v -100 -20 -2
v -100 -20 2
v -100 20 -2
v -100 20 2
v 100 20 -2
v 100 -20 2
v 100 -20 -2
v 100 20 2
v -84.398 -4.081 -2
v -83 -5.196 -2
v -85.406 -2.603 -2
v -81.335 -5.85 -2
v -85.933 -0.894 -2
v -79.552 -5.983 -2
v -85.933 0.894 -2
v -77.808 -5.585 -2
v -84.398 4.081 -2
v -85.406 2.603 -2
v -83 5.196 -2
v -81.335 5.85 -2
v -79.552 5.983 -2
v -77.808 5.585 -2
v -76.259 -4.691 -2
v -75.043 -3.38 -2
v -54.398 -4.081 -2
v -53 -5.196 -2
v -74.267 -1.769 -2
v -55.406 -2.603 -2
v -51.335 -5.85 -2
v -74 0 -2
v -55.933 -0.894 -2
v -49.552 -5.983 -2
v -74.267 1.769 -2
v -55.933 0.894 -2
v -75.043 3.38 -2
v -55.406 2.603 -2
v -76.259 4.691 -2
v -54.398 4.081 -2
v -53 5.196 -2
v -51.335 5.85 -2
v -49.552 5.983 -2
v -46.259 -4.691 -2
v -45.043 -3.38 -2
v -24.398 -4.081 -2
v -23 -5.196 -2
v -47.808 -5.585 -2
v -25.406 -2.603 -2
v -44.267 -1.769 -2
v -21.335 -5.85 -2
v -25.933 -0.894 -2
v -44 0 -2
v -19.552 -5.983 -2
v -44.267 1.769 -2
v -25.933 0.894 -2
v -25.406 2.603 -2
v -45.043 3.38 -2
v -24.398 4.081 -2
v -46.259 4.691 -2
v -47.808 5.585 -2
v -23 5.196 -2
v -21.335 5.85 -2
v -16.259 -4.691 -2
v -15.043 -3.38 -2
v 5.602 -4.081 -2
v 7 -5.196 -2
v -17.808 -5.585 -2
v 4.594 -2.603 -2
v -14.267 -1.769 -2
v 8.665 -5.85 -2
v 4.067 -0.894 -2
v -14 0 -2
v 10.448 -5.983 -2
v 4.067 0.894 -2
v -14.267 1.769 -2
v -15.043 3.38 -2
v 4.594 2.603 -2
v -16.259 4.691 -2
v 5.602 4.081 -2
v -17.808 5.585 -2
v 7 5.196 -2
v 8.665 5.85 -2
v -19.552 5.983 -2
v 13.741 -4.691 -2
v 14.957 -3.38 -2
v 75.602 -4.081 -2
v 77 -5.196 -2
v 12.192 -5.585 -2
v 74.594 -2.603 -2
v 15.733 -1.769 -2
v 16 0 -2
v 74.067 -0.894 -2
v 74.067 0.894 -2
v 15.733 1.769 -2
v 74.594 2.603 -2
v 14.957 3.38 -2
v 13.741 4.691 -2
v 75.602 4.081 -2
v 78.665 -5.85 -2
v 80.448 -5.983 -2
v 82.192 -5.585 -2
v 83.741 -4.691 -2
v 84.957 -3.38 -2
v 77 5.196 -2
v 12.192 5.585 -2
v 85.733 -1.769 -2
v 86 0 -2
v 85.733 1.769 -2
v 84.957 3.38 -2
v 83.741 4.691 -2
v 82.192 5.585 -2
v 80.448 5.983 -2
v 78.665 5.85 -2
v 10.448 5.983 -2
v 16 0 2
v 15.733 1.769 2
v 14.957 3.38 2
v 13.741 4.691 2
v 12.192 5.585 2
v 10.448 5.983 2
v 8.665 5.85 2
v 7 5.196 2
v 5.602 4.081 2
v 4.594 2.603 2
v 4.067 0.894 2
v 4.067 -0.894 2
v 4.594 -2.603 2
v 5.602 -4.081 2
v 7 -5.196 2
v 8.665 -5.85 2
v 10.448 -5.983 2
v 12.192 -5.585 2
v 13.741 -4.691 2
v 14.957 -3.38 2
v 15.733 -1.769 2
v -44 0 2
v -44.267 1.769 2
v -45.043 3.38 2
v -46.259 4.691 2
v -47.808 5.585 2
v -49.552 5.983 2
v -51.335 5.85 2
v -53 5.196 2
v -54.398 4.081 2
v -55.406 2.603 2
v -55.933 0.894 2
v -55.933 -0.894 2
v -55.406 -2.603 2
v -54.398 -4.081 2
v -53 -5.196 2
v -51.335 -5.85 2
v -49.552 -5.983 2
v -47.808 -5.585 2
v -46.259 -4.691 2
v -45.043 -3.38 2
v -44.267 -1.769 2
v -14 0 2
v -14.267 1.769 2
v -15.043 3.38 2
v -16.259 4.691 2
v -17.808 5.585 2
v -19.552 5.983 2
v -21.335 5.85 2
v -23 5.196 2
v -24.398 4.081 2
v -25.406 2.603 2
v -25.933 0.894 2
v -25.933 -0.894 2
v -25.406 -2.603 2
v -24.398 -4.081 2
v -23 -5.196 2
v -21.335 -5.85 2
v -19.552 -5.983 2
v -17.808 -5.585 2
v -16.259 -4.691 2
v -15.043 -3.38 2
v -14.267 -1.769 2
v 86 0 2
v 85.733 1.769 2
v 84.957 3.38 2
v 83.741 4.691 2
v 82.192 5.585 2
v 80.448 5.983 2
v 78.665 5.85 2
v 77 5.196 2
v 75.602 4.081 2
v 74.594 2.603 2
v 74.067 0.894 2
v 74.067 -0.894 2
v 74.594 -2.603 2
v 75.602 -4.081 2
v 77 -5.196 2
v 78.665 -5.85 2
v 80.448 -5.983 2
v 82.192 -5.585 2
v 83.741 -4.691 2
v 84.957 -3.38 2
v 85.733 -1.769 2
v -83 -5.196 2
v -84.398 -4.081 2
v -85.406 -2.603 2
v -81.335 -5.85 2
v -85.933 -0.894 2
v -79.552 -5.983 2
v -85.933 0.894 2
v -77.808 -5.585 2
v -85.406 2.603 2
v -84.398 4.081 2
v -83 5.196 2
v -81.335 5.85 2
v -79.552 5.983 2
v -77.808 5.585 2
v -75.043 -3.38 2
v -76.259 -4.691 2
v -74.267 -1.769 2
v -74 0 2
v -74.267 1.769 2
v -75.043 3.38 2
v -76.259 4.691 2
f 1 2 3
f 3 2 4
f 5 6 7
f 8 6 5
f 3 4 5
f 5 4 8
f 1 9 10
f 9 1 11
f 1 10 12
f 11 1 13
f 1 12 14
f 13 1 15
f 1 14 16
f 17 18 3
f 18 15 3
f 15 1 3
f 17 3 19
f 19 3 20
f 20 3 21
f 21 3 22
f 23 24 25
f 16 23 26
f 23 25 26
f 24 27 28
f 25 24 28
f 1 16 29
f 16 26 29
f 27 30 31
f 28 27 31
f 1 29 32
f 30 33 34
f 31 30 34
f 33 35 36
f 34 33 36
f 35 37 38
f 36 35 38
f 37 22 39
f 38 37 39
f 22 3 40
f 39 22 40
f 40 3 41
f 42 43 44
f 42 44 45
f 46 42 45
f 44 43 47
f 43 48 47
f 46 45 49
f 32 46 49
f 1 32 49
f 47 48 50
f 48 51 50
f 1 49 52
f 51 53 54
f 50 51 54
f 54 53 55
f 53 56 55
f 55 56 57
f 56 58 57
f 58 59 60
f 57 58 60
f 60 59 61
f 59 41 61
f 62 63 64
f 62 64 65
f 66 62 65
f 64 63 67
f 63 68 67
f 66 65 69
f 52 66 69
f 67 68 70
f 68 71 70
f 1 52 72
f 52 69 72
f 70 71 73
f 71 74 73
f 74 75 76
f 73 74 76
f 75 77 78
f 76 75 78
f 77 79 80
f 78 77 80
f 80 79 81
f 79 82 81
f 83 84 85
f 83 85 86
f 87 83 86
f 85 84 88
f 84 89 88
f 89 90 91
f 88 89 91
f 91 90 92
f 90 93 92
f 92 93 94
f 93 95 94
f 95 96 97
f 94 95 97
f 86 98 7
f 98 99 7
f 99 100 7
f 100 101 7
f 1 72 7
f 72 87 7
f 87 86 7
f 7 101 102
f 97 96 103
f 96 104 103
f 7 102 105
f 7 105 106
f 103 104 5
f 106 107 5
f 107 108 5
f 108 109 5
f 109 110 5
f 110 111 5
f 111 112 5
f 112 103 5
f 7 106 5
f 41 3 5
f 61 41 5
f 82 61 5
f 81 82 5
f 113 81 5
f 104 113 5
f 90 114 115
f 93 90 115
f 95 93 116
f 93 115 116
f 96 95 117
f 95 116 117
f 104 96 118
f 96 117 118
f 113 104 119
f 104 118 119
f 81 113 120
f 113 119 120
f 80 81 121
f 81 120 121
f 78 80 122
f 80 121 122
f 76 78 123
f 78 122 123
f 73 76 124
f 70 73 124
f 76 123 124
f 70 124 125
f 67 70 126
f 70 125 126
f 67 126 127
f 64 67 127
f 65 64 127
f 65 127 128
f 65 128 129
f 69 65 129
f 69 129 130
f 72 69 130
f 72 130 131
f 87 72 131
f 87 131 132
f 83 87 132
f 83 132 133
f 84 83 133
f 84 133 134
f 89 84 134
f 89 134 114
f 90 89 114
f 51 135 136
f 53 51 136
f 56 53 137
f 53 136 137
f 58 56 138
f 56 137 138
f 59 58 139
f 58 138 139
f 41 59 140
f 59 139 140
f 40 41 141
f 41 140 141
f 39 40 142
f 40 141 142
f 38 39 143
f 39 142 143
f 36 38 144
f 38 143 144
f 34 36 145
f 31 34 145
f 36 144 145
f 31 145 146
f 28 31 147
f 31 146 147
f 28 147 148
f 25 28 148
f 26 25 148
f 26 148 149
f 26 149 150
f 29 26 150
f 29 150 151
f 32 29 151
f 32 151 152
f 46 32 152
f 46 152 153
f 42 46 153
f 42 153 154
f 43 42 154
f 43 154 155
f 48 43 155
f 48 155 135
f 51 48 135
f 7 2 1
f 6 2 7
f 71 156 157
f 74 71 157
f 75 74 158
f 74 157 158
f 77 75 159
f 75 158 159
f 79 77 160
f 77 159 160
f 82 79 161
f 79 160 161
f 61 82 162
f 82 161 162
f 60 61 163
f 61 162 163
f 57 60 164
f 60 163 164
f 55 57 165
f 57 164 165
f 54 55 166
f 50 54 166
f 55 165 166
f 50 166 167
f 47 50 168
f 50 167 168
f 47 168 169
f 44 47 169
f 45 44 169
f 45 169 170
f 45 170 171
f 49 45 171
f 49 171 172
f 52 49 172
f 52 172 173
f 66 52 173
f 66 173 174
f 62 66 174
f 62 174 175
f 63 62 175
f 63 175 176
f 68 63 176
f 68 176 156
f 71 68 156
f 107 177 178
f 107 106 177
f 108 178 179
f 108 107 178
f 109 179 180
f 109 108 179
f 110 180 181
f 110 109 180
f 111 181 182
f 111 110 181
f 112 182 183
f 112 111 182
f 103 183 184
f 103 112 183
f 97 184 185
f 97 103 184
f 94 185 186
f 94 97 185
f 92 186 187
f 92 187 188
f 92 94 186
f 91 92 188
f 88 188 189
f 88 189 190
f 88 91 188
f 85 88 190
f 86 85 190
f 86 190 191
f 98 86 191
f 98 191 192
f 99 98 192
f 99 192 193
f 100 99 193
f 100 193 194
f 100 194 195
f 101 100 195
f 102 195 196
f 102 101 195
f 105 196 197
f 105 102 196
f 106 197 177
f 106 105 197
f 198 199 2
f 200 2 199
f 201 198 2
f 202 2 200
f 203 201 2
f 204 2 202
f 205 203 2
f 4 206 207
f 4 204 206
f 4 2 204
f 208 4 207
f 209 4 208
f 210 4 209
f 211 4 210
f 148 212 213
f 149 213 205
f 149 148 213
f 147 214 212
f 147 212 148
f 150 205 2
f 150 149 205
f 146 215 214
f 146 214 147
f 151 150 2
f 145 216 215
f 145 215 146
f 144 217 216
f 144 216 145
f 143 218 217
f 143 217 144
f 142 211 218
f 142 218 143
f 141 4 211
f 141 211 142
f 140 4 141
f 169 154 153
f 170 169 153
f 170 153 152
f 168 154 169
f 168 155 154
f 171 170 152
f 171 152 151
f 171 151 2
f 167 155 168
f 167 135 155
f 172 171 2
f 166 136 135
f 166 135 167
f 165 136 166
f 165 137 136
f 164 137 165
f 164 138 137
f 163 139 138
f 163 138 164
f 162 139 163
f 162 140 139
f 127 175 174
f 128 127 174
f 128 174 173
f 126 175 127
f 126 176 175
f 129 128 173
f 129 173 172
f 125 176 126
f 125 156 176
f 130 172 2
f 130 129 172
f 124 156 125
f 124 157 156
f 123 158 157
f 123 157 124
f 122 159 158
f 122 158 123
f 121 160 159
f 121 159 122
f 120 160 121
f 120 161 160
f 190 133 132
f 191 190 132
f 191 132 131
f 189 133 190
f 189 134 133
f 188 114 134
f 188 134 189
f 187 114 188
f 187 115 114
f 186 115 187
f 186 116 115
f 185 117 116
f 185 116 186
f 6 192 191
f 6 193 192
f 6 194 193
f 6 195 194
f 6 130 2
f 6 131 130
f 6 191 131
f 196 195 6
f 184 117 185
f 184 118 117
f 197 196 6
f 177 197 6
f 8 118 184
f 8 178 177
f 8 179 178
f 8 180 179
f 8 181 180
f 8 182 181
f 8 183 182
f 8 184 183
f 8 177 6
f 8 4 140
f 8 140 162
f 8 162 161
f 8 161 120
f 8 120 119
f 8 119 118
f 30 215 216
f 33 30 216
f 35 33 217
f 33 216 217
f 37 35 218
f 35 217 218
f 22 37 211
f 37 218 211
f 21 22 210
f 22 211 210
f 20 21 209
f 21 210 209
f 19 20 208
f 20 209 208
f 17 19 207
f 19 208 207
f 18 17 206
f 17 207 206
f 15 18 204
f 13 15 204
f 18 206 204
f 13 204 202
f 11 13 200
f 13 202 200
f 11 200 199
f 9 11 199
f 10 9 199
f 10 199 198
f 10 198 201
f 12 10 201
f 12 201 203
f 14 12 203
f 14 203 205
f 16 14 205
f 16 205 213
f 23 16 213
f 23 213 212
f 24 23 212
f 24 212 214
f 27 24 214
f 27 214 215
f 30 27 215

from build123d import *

# Parameters (mm, degrees)
SKETCH1_W           = 200
SKETCH1_H           = 40
SKETCH1_R           = 6
BOSS_EXTRUDE1_DEPTH = 2
SKETCH2_R           = 6
CUT_EXTRUDE1_DEPTH  = 5
LPATTERN1_COUNT     = 4
LPATTERN1_PITCH     = 30


with BuildPart() as part:
    # Sketch1 → Boss-Extrude1 (new body, symmetric)
    with BuildSketch(Plane.XY):
        Rectangle(SKETCH1_W, SKETCH1_H)
        with Locations((80, 0)):
            Circle(SKETCH1_R, mode=Mode.SUBTRACT)
    extrude(amount=BOSS_EXTRUDE1_DEPTH, both=True)

    # Sketch2 → Cut-Extrude1 (cut, through all)
    with BuildSketch(Plane.XY.offset(2)):
        with Locations((-80, 0)):
            Circle(SKETCH2_R)
    cut_extrude1 = extrude(amount=-CUT_EXTRUDE1_DEPTH, mode=Mode.SUBTRACT)

    # LPattern1: Cut-Extrude1 ×4
    with Locations(*[(i * LPATTERN1_PITCH, 0, 0) for i in range(1, LPATTERN1_COUNT)]):
        add(cut_extrude1, mode=Mode.SUBTRACT)


solid = part.part
